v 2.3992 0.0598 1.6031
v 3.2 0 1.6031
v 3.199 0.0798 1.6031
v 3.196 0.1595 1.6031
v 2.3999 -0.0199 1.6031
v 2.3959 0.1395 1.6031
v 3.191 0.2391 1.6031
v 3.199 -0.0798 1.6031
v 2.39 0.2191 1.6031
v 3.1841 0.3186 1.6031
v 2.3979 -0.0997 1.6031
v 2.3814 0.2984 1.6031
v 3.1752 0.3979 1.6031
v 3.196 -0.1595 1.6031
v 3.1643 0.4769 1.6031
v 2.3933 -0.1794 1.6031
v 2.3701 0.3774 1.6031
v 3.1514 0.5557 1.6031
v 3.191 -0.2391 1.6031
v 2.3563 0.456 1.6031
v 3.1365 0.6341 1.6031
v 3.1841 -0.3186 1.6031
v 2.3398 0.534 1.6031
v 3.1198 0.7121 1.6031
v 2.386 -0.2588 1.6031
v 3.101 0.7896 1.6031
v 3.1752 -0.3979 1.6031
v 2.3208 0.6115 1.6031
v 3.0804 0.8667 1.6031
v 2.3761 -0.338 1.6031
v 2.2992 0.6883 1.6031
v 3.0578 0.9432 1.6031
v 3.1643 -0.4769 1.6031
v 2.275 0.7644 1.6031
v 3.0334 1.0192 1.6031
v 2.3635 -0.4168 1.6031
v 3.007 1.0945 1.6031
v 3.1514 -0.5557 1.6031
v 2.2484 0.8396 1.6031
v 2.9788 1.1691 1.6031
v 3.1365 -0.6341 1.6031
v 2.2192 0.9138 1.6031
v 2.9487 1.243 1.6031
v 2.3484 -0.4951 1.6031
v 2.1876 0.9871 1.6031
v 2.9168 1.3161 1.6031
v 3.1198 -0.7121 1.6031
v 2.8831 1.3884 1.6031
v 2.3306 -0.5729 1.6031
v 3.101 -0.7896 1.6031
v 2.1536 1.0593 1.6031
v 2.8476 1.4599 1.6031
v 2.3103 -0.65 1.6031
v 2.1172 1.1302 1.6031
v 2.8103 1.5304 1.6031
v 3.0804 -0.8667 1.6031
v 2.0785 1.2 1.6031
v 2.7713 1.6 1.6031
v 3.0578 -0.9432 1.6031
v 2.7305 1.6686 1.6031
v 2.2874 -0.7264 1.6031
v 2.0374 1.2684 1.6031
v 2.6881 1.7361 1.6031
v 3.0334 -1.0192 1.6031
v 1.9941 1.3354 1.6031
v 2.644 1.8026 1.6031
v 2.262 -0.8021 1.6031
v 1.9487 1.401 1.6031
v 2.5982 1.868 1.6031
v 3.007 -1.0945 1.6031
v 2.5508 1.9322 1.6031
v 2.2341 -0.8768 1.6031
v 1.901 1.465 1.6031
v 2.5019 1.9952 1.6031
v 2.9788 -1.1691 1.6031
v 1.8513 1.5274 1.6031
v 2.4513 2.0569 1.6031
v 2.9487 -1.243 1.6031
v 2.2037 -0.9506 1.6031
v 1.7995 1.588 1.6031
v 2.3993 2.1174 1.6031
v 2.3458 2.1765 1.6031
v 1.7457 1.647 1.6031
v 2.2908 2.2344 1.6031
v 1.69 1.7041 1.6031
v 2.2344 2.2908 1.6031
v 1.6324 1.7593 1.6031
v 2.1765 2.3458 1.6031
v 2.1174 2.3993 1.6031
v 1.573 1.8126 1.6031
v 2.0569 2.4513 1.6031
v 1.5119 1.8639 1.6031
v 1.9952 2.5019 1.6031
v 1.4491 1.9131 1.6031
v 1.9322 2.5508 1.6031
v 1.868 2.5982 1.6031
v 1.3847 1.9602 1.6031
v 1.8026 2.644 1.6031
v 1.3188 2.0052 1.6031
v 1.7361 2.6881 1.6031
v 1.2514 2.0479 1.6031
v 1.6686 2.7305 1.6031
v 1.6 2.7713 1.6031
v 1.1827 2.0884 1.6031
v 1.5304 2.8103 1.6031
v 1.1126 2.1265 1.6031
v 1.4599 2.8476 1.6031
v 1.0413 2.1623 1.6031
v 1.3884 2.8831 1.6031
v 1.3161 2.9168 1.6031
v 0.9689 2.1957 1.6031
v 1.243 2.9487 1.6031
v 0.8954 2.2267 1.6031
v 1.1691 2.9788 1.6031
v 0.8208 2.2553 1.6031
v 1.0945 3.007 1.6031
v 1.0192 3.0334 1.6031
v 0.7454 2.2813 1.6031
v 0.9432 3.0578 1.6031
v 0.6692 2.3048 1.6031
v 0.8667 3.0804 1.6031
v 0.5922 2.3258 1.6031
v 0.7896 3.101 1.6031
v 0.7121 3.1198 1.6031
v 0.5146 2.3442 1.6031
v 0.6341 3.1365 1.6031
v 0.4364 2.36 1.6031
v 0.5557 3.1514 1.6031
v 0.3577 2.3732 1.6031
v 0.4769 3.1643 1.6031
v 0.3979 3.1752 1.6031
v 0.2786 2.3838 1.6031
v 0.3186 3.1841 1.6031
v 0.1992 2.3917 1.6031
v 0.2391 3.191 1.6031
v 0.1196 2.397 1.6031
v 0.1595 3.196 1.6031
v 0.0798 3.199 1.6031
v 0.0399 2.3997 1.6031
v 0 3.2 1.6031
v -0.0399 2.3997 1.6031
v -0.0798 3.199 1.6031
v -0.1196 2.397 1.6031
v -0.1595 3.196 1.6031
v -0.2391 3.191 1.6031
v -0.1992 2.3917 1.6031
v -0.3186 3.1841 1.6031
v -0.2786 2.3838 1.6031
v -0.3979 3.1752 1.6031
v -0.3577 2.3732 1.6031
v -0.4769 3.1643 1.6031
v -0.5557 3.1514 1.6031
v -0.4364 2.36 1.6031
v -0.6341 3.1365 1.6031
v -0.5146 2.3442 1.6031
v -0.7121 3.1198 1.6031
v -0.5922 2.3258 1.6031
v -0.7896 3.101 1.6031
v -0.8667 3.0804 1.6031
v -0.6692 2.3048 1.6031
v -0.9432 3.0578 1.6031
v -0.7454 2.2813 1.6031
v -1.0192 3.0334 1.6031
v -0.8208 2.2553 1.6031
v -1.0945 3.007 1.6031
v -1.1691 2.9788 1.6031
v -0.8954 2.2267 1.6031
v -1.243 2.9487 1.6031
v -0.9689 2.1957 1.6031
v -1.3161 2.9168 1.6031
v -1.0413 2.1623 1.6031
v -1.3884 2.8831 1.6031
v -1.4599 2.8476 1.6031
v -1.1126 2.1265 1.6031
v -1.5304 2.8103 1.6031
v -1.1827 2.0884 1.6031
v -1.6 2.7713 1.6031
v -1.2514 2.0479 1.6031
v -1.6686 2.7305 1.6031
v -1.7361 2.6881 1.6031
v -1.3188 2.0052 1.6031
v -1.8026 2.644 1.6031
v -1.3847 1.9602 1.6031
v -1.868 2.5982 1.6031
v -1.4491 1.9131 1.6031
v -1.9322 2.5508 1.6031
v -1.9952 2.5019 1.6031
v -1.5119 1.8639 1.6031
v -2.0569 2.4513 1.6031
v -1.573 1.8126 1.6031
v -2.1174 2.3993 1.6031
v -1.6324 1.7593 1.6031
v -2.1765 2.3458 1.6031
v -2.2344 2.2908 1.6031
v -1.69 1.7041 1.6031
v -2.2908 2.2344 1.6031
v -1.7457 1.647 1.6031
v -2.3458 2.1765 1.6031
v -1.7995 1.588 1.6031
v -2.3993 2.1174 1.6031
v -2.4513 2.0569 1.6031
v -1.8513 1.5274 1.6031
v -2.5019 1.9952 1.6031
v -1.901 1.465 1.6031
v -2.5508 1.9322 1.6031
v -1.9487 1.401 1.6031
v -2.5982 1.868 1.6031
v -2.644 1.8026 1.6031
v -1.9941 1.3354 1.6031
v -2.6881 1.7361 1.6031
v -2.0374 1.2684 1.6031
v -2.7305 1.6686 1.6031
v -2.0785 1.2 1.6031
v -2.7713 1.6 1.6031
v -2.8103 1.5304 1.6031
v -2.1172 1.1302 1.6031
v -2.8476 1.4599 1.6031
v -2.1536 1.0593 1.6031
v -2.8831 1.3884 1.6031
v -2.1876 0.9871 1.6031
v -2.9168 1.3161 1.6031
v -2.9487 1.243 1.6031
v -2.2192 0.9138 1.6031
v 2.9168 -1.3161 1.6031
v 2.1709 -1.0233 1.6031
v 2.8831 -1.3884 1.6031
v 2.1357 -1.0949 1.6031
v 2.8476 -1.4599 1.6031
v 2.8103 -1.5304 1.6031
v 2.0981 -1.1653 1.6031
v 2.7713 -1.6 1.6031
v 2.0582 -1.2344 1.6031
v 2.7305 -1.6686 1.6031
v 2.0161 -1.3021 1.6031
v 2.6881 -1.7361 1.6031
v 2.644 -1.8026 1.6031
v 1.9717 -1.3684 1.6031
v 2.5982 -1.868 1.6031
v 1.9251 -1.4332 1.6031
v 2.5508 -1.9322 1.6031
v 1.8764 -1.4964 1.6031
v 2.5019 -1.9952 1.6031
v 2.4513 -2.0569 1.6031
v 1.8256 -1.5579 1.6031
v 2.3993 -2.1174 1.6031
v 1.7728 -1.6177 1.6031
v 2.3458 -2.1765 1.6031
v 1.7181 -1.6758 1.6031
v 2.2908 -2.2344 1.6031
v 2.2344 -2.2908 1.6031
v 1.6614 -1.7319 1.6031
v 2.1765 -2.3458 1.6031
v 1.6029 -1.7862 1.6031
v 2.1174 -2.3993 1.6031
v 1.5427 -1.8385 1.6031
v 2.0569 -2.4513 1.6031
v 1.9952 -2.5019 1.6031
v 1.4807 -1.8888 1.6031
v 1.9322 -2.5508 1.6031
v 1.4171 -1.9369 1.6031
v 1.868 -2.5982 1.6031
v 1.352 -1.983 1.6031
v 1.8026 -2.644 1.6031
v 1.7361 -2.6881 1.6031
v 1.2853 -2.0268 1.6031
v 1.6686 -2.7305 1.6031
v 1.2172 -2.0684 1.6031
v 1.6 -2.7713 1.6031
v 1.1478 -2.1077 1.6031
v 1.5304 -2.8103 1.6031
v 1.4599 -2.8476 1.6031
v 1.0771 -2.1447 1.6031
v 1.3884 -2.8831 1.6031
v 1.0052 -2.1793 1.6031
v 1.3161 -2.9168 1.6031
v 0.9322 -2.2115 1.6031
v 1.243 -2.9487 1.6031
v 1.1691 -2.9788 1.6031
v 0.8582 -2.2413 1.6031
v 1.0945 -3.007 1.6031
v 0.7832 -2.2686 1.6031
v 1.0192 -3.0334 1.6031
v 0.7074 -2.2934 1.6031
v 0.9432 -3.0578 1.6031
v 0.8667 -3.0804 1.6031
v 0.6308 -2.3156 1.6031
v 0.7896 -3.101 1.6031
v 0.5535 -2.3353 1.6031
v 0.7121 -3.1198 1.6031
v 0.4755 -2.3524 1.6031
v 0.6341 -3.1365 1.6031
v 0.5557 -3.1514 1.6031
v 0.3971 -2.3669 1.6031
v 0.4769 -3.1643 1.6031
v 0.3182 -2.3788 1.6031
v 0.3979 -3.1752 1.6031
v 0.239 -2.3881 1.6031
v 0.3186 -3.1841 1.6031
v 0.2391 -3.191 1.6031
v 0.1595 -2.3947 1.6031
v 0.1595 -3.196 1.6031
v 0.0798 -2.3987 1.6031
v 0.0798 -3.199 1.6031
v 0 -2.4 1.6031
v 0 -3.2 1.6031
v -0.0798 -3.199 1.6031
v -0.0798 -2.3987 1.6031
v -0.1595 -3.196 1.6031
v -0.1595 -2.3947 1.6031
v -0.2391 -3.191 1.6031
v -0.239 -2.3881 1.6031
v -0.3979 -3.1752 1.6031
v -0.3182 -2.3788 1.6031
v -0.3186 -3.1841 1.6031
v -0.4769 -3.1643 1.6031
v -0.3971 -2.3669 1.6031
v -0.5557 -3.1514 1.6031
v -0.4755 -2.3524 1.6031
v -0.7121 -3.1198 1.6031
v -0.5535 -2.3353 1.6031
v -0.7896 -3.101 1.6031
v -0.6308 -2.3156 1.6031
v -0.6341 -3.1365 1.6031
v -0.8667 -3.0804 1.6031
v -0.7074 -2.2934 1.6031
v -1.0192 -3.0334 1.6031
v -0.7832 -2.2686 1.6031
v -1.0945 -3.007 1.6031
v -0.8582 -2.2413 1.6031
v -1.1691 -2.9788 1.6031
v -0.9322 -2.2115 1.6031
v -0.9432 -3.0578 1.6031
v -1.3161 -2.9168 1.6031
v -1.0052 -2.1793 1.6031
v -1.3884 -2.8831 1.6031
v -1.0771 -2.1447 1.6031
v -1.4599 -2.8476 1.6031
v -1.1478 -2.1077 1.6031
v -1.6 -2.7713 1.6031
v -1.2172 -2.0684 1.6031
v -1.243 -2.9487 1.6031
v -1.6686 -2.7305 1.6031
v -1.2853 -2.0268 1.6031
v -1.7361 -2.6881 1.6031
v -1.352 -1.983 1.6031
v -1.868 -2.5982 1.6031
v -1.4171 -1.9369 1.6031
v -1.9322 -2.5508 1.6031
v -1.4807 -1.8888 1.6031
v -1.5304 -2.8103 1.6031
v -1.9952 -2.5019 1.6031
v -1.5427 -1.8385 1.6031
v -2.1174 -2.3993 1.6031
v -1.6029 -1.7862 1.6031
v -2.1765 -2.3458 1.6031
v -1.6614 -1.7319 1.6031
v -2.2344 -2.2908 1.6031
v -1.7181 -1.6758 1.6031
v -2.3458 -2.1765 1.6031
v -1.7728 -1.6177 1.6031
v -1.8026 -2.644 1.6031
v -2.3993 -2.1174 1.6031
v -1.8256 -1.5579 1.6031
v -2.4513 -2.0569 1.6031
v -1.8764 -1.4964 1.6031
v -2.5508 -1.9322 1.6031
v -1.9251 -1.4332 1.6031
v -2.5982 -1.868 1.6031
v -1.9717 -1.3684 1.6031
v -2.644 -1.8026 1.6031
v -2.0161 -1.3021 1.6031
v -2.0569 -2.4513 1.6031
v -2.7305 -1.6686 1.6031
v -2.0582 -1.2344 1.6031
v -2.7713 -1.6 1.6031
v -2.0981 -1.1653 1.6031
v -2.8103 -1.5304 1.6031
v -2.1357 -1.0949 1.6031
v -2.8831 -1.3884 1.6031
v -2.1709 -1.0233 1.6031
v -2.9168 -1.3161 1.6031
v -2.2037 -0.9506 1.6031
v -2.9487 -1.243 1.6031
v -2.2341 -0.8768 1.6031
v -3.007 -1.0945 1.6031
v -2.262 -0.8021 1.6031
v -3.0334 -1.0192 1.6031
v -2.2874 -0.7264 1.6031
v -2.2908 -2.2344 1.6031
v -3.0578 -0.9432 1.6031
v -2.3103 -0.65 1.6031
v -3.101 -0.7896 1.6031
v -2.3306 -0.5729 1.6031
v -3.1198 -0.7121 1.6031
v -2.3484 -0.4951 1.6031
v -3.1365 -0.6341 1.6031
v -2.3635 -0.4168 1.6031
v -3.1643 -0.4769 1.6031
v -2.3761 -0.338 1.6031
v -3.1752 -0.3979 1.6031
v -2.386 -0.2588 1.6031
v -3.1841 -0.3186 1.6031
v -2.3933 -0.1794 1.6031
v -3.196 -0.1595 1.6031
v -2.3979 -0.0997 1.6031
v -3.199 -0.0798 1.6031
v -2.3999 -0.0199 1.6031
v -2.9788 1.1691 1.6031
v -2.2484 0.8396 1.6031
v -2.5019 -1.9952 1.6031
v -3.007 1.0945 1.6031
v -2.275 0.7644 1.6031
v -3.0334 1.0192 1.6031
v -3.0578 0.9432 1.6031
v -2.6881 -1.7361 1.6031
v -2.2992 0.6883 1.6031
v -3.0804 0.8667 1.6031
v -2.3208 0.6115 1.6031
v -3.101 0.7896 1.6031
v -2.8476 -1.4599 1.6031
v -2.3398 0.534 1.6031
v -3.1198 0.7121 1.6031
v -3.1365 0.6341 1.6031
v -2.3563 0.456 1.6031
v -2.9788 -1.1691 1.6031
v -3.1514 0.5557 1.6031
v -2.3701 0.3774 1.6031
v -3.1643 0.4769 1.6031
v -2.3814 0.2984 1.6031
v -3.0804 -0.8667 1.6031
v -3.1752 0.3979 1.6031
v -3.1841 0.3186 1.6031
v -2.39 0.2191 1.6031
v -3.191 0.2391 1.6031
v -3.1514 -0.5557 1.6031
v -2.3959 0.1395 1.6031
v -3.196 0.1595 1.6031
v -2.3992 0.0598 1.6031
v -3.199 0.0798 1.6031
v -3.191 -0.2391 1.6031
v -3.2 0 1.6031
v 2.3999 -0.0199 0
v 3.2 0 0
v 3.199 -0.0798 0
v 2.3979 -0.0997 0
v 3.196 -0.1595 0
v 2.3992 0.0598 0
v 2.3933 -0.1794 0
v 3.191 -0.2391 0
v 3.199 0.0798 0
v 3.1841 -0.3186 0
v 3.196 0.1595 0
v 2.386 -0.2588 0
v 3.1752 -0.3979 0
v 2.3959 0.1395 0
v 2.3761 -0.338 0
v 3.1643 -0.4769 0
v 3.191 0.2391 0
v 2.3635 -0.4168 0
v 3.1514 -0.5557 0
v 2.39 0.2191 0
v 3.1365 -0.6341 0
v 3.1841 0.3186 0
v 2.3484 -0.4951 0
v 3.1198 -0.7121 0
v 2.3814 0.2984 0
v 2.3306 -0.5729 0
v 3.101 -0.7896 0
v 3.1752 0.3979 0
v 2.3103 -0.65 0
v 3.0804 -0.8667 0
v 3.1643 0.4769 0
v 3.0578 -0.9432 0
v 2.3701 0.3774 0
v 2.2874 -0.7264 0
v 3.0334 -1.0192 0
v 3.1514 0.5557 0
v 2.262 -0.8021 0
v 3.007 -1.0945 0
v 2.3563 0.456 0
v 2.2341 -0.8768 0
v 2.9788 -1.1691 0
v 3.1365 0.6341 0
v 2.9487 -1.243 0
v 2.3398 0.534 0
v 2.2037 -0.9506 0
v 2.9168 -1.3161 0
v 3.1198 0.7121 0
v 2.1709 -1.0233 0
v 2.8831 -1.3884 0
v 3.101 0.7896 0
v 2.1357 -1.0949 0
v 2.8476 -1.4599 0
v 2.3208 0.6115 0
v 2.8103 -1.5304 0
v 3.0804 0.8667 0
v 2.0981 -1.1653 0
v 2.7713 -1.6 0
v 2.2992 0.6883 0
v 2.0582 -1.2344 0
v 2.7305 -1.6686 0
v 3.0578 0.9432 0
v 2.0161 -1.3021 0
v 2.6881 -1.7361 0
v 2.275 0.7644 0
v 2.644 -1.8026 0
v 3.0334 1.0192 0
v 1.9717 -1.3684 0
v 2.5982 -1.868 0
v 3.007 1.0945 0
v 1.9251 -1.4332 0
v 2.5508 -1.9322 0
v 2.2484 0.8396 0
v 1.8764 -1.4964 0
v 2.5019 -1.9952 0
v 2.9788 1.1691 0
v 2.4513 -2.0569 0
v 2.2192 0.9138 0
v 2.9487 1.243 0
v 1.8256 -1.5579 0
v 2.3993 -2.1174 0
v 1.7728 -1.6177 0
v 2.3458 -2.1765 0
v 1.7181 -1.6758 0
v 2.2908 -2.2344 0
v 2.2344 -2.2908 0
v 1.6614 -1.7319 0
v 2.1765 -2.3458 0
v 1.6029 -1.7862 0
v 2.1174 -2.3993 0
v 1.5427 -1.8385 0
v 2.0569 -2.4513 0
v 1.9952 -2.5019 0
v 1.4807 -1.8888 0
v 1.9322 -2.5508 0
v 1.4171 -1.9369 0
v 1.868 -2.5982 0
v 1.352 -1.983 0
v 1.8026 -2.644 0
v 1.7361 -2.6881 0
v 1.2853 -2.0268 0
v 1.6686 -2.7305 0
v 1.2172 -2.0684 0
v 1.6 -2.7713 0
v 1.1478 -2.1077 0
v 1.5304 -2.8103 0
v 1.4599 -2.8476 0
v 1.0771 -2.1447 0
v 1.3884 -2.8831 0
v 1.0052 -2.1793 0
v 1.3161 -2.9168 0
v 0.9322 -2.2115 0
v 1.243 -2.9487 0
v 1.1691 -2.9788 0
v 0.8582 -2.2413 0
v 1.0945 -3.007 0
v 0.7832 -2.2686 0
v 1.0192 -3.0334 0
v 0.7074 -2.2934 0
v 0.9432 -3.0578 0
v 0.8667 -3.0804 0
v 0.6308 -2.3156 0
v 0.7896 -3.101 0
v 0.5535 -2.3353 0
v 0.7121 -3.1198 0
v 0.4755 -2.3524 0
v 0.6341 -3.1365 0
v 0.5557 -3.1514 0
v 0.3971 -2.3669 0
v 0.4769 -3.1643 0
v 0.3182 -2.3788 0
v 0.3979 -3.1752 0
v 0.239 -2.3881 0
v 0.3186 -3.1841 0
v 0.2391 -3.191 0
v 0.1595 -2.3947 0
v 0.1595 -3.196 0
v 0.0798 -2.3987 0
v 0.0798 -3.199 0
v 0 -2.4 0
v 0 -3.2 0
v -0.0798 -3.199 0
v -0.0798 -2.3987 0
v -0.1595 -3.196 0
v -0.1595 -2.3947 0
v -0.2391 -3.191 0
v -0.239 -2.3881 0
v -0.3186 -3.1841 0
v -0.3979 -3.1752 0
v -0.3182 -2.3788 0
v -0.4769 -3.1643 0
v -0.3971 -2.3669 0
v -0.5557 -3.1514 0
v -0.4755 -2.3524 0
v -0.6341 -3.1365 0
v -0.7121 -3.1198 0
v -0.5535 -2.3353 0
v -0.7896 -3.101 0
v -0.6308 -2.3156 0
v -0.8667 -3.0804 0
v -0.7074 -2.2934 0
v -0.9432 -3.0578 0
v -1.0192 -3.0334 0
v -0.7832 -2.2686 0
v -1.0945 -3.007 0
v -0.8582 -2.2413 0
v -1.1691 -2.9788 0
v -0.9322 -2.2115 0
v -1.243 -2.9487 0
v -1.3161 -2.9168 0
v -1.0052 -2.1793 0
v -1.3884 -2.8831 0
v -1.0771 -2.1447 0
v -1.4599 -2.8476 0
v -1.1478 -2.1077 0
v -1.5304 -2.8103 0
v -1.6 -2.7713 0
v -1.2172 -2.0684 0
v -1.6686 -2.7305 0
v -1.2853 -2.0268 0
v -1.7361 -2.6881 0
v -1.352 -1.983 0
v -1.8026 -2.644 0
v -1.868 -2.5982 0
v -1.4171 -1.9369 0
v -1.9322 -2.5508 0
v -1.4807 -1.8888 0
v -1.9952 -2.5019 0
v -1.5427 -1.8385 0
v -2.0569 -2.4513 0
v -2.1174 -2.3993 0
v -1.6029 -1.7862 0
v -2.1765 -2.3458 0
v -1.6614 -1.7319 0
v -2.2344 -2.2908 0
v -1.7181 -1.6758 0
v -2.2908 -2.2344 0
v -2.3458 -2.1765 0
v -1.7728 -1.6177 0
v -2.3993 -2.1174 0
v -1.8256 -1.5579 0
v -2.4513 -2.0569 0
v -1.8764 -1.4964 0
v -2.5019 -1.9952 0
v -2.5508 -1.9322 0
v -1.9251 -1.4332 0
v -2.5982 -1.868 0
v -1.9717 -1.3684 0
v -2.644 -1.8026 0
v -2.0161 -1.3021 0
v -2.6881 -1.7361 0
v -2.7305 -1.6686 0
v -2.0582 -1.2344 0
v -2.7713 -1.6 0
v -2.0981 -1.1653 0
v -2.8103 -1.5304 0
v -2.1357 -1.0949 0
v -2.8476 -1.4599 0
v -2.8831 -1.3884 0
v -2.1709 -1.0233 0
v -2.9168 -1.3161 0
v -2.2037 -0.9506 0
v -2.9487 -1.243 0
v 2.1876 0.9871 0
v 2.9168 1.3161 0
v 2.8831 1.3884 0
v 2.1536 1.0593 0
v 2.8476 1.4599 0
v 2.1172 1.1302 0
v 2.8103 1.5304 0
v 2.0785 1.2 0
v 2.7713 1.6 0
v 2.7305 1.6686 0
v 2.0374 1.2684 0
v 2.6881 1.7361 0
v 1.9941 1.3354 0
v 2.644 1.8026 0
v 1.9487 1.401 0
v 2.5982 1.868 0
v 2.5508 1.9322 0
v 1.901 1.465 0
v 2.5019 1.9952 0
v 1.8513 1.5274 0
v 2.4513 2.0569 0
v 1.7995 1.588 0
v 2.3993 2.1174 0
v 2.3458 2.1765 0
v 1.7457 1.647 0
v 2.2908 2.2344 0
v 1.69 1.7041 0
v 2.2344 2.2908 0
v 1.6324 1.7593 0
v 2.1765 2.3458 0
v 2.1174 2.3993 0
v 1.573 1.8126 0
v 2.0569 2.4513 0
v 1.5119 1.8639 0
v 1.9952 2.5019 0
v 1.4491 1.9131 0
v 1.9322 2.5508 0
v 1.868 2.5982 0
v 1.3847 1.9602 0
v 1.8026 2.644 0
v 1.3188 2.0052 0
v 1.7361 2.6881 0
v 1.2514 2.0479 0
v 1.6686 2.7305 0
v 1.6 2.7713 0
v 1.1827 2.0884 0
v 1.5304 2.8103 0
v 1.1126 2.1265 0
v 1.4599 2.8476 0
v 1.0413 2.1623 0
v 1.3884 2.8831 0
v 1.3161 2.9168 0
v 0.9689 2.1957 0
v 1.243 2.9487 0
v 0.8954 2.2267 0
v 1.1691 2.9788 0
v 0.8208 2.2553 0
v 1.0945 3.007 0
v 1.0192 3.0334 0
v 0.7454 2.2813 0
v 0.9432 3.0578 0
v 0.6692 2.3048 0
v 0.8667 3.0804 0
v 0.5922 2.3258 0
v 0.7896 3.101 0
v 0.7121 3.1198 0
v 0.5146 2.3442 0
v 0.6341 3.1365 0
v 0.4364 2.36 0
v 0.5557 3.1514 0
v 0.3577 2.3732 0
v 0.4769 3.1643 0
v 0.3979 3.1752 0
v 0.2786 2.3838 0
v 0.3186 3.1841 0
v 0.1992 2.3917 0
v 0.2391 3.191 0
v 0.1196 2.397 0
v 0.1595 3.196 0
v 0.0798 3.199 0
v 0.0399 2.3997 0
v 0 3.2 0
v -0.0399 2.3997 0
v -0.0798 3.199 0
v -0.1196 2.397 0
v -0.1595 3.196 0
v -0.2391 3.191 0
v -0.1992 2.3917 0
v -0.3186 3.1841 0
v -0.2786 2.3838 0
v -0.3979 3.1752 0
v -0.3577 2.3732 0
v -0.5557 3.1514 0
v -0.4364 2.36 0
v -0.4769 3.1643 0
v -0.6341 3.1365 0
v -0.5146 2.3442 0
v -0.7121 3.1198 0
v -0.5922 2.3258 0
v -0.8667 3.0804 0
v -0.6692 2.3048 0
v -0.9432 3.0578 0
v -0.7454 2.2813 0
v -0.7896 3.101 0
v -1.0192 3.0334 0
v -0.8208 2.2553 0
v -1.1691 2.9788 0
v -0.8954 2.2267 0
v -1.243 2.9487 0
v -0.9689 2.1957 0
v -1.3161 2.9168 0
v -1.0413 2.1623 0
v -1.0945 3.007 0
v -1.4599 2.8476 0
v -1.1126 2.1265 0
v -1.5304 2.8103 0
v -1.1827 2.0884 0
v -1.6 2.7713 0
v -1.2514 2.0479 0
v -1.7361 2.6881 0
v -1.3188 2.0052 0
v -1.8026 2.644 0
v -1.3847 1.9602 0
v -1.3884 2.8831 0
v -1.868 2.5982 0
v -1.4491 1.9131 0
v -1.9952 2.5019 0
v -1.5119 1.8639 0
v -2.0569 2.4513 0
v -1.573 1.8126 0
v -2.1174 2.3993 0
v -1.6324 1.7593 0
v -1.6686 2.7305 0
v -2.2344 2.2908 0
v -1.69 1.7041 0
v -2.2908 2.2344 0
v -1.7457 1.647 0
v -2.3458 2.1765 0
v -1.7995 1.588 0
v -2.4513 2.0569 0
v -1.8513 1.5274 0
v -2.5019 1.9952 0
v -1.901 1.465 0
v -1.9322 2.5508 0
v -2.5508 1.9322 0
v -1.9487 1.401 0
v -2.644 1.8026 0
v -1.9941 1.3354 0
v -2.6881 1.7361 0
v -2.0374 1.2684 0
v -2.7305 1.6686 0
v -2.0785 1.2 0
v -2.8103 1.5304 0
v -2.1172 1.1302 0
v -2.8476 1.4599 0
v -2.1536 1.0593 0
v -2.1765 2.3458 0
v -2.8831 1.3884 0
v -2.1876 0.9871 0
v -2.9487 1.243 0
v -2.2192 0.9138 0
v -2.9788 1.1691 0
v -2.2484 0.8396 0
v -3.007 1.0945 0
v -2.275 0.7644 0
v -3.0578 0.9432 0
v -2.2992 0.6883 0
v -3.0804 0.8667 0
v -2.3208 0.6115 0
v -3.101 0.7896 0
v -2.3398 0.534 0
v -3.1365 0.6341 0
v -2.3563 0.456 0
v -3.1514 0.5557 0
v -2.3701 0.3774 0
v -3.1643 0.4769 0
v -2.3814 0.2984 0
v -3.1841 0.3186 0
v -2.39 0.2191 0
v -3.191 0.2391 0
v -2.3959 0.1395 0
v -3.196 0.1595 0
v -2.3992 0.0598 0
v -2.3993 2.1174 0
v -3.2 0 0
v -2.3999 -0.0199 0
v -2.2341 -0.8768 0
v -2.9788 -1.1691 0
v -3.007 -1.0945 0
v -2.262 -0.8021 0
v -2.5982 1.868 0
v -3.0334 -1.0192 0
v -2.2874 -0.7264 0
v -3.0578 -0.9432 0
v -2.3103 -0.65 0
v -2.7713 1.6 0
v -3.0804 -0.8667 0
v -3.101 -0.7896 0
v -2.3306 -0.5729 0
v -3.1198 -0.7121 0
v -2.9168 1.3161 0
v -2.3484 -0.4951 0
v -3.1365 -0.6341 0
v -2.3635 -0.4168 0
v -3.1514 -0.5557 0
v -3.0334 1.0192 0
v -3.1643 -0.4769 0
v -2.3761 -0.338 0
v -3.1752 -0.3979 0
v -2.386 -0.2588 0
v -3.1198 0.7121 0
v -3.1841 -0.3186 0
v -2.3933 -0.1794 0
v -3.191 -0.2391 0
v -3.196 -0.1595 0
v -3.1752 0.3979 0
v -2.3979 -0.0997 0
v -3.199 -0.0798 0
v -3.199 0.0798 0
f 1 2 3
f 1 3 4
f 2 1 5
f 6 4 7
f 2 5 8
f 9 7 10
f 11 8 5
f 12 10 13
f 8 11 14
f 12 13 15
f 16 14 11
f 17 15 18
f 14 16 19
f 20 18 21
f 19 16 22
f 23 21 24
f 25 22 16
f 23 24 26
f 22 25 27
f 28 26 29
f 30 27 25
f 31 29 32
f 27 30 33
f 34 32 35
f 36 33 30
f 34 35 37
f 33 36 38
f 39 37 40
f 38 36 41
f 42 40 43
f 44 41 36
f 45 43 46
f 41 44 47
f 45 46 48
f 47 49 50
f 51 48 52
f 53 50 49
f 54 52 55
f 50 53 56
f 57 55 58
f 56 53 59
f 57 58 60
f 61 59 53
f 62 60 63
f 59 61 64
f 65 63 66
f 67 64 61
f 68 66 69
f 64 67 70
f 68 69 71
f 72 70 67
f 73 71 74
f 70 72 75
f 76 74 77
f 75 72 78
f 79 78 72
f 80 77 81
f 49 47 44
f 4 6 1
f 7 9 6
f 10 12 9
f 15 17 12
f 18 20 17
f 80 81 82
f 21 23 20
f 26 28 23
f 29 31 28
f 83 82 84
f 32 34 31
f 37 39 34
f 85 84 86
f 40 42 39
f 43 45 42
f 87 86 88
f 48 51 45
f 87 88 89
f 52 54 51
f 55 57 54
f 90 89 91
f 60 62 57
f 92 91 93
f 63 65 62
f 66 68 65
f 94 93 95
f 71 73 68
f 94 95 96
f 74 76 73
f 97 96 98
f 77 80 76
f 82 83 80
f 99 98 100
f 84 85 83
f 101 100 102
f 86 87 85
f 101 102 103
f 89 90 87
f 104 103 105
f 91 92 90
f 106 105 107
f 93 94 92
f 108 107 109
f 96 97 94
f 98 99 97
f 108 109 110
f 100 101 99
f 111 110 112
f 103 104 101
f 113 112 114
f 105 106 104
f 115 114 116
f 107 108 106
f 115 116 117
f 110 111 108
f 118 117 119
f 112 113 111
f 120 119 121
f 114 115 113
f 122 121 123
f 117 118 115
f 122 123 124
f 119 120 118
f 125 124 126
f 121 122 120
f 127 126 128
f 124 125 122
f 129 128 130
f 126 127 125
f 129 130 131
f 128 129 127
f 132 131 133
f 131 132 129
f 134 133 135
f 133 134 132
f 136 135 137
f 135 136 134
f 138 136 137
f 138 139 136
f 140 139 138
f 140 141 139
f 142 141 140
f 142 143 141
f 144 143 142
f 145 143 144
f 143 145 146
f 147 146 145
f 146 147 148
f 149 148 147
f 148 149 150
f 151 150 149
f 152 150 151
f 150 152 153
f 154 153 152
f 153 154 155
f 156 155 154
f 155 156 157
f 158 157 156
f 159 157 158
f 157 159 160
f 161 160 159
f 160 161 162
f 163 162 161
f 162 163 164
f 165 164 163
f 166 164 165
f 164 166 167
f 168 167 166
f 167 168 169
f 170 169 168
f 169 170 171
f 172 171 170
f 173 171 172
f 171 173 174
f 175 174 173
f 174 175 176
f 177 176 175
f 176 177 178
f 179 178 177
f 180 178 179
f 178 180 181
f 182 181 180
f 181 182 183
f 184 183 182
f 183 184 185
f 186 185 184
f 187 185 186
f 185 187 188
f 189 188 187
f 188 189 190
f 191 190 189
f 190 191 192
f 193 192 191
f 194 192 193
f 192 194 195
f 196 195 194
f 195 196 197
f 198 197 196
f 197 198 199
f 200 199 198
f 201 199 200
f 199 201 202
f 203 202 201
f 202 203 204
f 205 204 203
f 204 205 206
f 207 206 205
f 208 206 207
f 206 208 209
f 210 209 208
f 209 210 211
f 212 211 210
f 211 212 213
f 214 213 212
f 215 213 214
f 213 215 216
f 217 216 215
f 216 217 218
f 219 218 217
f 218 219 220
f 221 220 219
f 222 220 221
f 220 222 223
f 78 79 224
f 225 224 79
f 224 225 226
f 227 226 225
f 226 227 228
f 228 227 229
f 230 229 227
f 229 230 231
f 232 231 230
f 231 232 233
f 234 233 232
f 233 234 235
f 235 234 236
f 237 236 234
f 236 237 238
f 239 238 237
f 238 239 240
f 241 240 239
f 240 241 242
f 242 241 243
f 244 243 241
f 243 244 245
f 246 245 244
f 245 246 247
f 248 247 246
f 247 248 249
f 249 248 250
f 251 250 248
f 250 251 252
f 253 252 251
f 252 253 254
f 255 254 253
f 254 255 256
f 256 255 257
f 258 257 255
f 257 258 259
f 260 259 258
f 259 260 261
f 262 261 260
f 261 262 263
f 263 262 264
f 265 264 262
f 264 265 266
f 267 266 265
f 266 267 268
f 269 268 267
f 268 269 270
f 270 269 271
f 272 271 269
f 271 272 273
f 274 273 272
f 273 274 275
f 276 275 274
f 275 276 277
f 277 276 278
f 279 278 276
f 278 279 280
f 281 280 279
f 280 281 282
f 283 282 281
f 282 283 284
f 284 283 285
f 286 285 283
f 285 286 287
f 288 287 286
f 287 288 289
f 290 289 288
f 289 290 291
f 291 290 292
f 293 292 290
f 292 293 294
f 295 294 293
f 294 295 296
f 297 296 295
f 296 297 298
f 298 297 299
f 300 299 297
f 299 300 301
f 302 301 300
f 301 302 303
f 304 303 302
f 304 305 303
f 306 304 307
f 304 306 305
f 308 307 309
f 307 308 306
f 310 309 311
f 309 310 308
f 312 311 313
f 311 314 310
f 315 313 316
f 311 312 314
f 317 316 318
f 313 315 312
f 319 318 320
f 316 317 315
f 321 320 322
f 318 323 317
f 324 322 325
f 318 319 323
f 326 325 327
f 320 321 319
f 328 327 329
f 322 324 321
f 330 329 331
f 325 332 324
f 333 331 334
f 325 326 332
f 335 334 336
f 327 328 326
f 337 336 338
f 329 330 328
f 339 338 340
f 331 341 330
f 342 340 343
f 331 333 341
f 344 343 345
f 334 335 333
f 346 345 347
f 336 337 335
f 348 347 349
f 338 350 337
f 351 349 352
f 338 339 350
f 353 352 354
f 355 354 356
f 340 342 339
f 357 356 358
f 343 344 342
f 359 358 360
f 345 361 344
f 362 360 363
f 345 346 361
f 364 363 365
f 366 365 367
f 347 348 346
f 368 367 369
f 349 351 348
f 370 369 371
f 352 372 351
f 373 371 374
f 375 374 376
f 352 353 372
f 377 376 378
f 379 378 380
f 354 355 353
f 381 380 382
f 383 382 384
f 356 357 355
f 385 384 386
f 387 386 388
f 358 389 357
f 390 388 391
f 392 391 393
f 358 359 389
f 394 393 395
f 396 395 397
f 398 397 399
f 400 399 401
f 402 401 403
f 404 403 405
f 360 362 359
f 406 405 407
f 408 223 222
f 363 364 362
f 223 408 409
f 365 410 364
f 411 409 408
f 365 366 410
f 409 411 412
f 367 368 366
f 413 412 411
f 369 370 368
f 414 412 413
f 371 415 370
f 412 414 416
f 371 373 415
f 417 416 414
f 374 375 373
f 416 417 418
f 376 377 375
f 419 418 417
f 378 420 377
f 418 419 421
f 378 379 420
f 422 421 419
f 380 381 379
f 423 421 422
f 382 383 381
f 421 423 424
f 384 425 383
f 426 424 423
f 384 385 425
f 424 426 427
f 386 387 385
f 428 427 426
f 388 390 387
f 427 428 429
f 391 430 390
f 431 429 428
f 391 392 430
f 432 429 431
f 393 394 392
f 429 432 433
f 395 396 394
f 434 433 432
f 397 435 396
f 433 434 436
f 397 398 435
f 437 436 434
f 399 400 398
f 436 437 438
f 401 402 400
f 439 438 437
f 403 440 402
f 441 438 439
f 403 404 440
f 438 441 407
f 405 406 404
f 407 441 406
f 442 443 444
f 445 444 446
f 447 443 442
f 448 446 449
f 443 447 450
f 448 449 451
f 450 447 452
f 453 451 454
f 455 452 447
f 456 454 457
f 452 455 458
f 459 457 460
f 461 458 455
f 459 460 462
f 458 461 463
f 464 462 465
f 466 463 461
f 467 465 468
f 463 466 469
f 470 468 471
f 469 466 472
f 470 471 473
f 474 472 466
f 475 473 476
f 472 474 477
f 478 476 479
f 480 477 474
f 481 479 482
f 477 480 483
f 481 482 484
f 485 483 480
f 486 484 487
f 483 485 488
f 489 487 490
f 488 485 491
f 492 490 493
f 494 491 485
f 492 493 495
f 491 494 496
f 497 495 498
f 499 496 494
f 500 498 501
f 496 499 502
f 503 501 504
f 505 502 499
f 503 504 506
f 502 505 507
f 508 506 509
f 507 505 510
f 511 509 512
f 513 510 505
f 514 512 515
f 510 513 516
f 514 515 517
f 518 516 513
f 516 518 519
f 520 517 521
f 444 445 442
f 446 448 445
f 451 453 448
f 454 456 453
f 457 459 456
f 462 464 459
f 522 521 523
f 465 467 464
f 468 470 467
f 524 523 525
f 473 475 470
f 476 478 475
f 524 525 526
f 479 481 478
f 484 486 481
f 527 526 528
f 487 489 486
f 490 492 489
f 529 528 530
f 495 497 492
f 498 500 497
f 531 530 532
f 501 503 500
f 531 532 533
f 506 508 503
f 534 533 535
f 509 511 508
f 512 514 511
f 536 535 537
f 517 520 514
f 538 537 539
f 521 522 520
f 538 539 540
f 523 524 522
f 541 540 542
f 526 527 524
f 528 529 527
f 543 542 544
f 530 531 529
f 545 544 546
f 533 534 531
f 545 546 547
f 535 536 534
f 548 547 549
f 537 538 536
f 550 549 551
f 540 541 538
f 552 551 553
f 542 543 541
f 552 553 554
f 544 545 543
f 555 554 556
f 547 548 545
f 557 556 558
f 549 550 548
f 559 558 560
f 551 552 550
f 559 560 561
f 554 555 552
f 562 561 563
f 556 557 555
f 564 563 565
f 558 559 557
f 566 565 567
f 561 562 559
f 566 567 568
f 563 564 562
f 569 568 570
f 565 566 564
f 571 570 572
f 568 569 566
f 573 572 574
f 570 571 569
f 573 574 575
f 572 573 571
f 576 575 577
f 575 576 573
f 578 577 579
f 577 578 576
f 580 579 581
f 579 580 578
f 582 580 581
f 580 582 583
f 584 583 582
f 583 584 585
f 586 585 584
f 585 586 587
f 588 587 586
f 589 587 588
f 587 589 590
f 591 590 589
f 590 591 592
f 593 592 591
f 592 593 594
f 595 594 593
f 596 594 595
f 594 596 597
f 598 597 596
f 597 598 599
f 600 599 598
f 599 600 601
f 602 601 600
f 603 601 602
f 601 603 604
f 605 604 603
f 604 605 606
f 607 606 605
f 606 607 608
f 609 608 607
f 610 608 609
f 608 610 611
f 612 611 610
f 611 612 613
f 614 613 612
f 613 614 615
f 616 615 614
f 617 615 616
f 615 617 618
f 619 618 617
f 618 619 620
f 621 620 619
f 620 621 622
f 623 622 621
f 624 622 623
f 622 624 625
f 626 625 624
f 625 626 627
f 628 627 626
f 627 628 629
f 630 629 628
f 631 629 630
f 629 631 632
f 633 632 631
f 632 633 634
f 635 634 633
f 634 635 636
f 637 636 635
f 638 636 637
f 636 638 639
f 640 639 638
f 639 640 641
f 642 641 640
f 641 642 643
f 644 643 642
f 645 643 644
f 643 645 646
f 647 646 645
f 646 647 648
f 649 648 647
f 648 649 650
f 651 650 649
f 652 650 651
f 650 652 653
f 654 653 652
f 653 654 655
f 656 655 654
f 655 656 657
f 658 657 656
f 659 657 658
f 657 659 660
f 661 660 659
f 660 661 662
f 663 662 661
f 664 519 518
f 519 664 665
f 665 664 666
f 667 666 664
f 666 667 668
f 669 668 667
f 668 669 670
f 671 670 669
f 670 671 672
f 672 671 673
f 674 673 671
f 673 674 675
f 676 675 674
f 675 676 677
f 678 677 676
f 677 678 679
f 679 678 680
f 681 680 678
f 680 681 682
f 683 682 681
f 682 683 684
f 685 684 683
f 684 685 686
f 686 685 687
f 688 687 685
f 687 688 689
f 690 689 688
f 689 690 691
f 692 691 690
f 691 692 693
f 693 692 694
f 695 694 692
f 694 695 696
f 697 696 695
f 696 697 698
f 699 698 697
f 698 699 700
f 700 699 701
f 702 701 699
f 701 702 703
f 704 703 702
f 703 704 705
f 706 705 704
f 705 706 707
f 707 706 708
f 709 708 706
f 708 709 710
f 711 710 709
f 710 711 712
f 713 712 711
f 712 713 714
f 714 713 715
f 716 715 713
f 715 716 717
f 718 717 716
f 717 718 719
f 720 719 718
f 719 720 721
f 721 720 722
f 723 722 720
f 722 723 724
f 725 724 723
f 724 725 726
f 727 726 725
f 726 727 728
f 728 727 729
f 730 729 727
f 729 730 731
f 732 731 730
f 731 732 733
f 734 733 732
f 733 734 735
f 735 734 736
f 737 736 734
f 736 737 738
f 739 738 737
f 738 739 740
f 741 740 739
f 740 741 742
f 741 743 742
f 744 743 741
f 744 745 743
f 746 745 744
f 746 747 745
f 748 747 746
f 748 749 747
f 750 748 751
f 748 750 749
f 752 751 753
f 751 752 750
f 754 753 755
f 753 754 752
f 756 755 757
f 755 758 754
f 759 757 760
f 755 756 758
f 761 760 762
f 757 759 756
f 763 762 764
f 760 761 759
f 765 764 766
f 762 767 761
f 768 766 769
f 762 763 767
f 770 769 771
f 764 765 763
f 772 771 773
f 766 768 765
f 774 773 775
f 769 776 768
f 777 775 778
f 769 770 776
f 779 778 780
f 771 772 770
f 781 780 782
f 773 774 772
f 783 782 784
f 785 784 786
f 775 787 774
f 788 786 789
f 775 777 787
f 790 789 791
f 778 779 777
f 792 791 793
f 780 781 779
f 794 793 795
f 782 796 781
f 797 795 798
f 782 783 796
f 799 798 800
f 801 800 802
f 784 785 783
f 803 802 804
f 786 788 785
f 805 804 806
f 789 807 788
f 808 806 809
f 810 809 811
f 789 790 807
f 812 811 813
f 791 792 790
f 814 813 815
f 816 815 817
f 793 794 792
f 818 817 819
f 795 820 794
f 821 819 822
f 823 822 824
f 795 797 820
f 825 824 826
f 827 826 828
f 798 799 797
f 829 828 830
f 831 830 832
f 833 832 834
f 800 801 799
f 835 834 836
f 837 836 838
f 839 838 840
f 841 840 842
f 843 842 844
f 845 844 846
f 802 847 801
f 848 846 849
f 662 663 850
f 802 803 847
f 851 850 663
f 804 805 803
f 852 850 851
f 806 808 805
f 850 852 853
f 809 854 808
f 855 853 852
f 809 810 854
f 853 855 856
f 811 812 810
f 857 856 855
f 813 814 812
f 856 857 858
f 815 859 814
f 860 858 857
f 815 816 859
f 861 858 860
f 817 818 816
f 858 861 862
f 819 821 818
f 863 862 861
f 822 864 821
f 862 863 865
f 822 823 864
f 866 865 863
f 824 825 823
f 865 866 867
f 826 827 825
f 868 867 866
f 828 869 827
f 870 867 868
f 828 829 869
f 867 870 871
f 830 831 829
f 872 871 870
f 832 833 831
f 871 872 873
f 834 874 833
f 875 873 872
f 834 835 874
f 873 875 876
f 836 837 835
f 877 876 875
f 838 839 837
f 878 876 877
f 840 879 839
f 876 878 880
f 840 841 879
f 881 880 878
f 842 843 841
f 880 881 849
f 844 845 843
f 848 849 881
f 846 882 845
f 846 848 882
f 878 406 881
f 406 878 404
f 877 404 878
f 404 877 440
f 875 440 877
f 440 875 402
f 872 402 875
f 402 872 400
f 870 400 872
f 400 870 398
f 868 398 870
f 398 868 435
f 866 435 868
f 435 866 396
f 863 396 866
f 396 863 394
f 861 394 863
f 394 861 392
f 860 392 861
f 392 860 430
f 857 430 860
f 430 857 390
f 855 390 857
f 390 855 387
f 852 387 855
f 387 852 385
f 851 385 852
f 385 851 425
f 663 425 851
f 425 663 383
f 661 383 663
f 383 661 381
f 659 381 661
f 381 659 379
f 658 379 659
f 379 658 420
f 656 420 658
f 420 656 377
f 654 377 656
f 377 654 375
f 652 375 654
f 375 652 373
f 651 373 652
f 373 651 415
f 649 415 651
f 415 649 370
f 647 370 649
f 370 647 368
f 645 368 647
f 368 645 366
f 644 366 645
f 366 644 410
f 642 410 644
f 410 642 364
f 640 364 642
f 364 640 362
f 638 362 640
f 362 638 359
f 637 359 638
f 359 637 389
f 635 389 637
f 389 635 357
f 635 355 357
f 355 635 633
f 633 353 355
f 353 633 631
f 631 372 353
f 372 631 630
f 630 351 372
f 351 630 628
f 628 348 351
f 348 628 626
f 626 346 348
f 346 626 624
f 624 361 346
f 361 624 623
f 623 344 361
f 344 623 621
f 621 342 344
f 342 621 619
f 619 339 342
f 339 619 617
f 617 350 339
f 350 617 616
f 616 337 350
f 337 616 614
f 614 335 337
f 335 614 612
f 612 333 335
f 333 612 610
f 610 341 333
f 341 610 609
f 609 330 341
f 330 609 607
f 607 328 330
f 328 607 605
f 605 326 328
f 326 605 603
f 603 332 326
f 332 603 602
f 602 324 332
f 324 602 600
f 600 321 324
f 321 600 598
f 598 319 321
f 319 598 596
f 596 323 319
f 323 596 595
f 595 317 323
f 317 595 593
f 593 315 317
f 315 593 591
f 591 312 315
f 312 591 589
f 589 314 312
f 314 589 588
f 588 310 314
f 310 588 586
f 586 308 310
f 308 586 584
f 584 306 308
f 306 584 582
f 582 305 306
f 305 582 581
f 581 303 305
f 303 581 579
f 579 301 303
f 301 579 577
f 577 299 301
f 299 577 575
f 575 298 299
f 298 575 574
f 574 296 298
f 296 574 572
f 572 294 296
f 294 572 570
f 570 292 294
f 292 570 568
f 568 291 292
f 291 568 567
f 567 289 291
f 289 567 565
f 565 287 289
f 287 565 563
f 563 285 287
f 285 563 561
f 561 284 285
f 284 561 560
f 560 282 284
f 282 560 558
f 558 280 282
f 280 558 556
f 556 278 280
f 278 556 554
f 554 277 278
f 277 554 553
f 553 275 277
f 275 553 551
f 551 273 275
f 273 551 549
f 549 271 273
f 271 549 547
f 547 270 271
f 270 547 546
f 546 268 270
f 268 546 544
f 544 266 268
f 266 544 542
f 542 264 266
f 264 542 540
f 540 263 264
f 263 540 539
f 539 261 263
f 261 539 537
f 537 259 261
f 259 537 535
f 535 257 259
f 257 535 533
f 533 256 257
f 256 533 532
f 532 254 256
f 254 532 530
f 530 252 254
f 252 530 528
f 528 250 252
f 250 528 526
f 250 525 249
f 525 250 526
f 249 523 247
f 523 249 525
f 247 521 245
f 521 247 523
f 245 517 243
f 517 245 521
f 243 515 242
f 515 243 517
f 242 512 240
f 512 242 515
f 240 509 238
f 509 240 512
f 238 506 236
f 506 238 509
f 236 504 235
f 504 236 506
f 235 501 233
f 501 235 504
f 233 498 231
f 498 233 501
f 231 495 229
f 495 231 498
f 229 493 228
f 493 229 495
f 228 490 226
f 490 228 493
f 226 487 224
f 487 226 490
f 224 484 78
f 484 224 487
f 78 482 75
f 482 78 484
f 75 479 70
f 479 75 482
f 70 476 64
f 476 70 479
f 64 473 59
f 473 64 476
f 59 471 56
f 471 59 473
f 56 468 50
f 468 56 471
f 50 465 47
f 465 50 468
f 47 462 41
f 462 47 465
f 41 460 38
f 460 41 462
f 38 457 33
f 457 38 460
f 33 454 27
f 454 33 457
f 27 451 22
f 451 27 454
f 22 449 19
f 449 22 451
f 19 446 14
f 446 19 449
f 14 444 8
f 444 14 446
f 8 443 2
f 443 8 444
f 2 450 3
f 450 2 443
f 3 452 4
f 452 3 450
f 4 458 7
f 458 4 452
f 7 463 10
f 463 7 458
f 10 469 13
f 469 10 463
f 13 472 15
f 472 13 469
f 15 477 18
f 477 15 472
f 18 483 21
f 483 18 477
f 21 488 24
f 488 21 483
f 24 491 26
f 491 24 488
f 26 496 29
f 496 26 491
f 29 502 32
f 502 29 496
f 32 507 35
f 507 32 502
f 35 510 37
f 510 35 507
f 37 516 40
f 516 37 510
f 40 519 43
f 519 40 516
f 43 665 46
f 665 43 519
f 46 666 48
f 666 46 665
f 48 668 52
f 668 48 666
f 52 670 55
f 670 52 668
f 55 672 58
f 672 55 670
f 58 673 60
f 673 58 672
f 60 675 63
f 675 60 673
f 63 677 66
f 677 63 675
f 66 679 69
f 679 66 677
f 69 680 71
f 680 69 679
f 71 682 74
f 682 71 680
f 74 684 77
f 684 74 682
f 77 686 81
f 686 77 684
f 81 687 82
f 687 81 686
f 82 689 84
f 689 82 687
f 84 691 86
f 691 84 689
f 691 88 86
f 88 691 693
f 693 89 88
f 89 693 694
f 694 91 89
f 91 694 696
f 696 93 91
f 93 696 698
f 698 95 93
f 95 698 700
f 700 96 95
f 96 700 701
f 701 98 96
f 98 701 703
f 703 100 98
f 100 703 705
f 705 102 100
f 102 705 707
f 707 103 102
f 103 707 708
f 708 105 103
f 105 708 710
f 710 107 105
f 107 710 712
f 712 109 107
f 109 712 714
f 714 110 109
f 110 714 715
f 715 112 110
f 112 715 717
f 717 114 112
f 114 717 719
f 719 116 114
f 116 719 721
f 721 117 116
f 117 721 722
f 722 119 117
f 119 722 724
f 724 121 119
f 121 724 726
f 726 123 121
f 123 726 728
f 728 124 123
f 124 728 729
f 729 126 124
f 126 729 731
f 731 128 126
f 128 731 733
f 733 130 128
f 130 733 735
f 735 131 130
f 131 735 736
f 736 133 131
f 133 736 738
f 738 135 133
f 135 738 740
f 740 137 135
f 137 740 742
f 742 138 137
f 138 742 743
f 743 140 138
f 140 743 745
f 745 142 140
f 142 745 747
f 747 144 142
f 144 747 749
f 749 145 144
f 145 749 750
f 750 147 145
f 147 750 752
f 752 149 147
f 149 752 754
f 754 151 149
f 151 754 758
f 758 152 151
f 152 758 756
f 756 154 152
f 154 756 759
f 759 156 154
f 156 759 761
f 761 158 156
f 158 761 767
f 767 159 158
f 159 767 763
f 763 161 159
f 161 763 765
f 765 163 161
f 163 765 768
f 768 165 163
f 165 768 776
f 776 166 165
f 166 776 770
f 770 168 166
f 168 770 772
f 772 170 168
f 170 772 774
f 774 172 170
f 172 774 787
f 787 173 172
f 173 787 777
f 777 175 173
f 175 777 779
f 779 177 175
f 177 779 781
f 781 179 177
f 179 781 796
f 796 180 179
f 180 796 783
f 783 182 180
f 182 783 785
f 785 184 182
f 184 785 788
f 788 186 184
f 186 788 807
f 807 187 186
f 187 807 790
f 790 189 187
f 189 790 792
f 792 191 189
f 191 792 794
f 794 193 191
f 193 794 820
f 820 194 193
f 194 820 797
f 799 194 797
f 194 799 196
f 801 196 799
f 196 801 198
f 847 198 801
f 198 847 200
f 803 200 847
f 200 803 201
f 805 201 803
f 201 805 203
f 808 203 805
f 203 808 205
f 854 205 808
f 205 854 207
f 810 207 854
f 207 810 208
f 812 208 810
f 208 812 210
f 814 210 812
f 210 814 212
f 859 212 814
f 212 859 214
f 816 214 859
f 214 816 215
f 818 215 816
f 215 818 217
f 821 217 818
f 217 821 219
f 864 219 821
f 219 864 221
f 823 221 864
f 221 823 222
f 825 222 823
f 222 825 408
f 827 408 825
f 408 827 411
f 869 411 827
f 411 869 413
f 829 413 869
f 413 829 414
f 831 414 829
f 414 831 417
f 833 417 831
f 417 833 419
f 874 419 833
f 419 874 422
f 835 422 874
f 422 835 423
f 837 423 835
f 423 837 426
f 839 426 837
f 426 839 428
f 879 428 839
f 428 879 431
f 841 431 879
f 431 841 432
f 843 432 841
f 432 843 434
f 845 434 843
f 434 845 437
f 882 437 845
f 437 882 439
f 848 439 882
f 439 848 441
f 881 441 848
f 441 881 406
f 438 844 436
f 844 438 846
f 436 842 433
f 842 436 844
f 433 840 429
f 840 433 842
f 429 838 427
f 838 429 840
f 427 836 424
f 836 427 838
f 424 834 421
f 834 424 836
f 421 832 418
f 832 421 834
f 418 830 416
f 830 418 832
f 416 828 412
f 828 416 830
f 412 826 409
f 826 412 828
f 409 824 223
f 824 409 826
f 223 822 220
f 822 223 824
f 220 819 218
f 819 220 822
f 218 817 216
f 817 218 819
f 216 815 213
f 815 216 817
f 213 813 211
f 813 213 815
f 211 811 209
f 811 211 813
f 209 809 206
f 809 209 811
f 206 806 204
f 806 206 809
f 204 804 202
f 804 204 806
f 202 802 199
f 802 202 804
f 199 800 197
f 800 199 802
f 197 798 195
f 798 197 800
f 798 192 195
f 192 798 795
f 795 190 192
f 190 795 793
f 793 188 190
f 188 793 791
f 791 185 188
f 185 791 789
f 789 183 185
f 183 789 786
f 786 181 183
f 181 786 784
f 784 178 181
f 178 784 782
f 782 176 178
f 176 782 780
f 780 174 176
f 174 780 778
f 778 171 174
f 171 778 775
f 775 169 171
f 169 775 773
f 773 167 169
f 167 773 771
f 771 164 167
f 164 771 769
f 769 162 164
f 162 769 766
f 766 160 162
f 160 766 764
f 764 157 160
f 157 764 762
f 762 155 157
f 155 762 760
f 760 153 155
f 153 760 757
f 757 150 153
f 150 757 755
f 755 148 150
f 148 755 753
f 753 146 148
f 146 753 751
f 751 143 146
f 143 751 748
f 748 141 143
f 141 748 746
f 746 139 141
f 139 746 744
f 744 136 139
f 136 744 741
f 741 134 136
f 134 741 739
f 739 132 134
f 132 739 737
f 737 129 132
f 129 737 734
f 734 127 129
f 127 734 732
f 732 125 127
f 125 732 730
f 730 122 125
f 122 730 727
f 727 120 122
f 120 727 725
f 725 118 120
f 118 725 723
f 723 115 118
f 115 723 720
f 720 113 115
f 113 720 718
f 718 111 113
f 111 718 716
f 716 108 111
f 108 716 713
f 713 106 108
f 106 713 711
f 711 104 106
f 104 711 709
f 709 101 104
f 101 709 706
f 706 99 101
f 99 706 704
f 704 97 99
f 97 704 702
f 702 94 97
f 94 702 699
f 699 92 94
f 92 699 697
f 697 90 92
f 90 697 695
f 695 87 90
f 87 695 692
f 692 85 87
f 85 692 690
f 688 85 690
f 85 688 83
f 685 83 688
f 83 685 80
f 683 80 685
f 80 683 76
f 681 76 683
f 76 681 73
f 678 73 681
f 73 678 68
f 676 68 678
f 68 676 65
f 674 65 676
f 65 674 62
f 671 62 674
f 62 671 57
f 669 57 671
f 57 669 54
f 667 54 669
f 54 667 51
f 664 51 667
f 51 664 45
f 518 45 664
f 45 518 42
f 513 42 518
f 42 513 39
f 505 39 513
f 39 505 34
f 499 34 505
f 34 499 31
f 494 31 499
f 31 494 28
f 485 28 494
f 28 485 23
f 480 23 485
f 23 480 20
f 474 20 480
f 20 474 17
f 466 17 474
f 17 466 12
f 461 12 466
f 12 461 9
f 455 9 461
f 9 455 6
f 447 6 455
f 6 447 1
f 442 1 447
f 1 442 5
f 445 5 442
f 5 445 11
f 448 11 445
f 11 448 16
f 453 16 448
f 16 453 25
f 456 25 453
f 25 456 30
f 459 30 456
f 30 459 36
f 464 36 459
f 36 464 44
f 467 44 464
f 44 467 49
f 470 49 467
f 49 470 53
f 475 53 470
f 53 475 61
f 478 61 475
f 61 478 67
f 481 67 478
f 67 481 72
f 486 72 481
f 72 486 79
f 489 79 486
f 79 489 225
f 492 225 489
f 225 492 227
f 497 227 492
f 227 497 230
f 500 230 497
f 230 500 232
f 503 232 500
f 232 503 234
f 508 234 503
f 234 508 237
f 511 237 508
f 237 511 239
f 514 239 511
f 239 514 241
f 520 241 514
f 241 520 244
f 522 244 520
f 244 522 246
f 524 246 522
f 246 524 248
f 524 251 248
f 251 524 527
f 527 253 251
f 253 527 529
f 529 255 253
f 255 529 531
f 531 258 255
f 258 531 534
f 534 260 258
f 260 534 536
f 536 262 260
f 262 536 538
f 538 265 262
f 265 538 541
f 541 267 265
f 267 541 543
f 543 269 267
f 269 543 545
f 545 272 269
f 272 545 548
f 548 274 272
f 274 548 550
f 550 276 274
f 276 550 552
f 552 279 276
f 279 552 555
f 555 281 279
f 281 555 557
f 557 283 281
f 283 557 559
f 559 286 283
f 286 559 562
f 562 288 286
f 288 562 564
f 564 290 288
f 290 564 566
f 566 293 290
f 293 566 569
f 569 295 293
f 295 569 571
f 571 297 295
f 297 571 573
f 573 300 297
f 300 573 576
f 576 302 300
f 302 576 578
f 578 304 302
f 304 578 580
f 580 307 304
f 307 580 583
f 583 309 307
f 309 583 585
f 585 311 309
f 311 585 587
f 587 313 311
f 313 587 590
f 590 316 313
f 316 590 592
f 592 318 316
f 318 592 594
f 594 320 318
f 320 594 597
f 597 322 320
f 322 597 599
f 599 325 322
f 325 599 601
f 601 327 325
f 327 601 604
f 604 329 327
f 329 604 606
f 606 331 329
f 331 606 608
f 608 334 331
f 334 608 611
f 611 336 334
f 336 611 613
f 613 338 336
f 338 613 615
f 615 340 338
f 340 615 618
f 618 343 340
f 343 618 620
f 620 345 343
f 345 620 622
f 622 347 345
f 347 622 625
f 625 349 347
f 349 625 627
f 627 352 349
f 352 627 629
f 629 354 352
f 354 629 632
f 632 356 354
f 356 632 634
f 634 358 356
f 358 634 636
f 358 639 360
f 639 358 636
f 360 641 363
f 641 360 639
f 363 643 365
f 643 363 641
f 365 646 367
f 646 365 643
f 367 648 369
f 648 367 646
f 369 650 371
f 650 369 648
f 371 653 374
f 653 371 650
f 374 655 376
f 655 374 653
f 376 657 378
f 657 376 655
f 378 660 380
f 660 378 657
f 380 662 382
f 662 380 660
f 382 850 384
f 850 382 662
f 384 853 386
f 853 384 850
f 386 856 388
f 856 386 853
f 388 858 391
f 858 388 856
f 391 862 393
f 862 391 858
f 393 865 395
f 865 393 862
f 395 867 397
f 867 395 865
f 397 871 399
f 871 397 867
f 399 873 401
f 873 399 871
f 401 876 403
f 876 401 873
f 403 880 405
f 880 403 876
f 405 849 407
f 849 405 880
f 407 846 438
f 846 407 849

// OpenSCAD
use <../lib.scad>
use <193a.scad>
$fa=1; $fs=0.2;
function ldraw_lib__193(realsolid=false) = [
// 0 ~Moved to 193a
// 0 Name: 193.dat
// 0 Author: [PTadmin]
// 0 !LDRAW_ORG Part UPDATE 2004-02
// 0 !LICENSE Licensed under CC BY 4.0 : see CAreadme.txt
// 
// 0 BFC CERTIFY CCW
  [0,"BFC","CERTIFY"],
  [0,"BFC","CCW"],
// 
// 0 !HISTORY 2002-08-18 [PTadmin] Official Update 2002-04
// 0 !HISTORY 2004-04-22 [PTadmin] Official Update 2004-02
// 0 !HISTORY 2007-05-10 [PTadmin] Header formatted for Contributor Agreement
// 0 !HISTORY 2008-07-01 [PTadmin] Official Update 2008-01
// 
// 
// 1 16 0 0 0 1 0 0 0 1 0 0 0 1 193a.dat
  [1,16,0,0,0,1,0,0,0,1,0,0,0,1, ldraw_lib__193a(realsolid)],
];
module ldraw_lib__193(step=0, col=false, unit=2/5, alt=false, line=0.2, solid=!$preview)
    makepoly(ldraw_lib__193(solid), step=step, col=col, unit=unit, alt=alt, line=line, solid=solid);
ldraw_lib__193(line=0.2);
